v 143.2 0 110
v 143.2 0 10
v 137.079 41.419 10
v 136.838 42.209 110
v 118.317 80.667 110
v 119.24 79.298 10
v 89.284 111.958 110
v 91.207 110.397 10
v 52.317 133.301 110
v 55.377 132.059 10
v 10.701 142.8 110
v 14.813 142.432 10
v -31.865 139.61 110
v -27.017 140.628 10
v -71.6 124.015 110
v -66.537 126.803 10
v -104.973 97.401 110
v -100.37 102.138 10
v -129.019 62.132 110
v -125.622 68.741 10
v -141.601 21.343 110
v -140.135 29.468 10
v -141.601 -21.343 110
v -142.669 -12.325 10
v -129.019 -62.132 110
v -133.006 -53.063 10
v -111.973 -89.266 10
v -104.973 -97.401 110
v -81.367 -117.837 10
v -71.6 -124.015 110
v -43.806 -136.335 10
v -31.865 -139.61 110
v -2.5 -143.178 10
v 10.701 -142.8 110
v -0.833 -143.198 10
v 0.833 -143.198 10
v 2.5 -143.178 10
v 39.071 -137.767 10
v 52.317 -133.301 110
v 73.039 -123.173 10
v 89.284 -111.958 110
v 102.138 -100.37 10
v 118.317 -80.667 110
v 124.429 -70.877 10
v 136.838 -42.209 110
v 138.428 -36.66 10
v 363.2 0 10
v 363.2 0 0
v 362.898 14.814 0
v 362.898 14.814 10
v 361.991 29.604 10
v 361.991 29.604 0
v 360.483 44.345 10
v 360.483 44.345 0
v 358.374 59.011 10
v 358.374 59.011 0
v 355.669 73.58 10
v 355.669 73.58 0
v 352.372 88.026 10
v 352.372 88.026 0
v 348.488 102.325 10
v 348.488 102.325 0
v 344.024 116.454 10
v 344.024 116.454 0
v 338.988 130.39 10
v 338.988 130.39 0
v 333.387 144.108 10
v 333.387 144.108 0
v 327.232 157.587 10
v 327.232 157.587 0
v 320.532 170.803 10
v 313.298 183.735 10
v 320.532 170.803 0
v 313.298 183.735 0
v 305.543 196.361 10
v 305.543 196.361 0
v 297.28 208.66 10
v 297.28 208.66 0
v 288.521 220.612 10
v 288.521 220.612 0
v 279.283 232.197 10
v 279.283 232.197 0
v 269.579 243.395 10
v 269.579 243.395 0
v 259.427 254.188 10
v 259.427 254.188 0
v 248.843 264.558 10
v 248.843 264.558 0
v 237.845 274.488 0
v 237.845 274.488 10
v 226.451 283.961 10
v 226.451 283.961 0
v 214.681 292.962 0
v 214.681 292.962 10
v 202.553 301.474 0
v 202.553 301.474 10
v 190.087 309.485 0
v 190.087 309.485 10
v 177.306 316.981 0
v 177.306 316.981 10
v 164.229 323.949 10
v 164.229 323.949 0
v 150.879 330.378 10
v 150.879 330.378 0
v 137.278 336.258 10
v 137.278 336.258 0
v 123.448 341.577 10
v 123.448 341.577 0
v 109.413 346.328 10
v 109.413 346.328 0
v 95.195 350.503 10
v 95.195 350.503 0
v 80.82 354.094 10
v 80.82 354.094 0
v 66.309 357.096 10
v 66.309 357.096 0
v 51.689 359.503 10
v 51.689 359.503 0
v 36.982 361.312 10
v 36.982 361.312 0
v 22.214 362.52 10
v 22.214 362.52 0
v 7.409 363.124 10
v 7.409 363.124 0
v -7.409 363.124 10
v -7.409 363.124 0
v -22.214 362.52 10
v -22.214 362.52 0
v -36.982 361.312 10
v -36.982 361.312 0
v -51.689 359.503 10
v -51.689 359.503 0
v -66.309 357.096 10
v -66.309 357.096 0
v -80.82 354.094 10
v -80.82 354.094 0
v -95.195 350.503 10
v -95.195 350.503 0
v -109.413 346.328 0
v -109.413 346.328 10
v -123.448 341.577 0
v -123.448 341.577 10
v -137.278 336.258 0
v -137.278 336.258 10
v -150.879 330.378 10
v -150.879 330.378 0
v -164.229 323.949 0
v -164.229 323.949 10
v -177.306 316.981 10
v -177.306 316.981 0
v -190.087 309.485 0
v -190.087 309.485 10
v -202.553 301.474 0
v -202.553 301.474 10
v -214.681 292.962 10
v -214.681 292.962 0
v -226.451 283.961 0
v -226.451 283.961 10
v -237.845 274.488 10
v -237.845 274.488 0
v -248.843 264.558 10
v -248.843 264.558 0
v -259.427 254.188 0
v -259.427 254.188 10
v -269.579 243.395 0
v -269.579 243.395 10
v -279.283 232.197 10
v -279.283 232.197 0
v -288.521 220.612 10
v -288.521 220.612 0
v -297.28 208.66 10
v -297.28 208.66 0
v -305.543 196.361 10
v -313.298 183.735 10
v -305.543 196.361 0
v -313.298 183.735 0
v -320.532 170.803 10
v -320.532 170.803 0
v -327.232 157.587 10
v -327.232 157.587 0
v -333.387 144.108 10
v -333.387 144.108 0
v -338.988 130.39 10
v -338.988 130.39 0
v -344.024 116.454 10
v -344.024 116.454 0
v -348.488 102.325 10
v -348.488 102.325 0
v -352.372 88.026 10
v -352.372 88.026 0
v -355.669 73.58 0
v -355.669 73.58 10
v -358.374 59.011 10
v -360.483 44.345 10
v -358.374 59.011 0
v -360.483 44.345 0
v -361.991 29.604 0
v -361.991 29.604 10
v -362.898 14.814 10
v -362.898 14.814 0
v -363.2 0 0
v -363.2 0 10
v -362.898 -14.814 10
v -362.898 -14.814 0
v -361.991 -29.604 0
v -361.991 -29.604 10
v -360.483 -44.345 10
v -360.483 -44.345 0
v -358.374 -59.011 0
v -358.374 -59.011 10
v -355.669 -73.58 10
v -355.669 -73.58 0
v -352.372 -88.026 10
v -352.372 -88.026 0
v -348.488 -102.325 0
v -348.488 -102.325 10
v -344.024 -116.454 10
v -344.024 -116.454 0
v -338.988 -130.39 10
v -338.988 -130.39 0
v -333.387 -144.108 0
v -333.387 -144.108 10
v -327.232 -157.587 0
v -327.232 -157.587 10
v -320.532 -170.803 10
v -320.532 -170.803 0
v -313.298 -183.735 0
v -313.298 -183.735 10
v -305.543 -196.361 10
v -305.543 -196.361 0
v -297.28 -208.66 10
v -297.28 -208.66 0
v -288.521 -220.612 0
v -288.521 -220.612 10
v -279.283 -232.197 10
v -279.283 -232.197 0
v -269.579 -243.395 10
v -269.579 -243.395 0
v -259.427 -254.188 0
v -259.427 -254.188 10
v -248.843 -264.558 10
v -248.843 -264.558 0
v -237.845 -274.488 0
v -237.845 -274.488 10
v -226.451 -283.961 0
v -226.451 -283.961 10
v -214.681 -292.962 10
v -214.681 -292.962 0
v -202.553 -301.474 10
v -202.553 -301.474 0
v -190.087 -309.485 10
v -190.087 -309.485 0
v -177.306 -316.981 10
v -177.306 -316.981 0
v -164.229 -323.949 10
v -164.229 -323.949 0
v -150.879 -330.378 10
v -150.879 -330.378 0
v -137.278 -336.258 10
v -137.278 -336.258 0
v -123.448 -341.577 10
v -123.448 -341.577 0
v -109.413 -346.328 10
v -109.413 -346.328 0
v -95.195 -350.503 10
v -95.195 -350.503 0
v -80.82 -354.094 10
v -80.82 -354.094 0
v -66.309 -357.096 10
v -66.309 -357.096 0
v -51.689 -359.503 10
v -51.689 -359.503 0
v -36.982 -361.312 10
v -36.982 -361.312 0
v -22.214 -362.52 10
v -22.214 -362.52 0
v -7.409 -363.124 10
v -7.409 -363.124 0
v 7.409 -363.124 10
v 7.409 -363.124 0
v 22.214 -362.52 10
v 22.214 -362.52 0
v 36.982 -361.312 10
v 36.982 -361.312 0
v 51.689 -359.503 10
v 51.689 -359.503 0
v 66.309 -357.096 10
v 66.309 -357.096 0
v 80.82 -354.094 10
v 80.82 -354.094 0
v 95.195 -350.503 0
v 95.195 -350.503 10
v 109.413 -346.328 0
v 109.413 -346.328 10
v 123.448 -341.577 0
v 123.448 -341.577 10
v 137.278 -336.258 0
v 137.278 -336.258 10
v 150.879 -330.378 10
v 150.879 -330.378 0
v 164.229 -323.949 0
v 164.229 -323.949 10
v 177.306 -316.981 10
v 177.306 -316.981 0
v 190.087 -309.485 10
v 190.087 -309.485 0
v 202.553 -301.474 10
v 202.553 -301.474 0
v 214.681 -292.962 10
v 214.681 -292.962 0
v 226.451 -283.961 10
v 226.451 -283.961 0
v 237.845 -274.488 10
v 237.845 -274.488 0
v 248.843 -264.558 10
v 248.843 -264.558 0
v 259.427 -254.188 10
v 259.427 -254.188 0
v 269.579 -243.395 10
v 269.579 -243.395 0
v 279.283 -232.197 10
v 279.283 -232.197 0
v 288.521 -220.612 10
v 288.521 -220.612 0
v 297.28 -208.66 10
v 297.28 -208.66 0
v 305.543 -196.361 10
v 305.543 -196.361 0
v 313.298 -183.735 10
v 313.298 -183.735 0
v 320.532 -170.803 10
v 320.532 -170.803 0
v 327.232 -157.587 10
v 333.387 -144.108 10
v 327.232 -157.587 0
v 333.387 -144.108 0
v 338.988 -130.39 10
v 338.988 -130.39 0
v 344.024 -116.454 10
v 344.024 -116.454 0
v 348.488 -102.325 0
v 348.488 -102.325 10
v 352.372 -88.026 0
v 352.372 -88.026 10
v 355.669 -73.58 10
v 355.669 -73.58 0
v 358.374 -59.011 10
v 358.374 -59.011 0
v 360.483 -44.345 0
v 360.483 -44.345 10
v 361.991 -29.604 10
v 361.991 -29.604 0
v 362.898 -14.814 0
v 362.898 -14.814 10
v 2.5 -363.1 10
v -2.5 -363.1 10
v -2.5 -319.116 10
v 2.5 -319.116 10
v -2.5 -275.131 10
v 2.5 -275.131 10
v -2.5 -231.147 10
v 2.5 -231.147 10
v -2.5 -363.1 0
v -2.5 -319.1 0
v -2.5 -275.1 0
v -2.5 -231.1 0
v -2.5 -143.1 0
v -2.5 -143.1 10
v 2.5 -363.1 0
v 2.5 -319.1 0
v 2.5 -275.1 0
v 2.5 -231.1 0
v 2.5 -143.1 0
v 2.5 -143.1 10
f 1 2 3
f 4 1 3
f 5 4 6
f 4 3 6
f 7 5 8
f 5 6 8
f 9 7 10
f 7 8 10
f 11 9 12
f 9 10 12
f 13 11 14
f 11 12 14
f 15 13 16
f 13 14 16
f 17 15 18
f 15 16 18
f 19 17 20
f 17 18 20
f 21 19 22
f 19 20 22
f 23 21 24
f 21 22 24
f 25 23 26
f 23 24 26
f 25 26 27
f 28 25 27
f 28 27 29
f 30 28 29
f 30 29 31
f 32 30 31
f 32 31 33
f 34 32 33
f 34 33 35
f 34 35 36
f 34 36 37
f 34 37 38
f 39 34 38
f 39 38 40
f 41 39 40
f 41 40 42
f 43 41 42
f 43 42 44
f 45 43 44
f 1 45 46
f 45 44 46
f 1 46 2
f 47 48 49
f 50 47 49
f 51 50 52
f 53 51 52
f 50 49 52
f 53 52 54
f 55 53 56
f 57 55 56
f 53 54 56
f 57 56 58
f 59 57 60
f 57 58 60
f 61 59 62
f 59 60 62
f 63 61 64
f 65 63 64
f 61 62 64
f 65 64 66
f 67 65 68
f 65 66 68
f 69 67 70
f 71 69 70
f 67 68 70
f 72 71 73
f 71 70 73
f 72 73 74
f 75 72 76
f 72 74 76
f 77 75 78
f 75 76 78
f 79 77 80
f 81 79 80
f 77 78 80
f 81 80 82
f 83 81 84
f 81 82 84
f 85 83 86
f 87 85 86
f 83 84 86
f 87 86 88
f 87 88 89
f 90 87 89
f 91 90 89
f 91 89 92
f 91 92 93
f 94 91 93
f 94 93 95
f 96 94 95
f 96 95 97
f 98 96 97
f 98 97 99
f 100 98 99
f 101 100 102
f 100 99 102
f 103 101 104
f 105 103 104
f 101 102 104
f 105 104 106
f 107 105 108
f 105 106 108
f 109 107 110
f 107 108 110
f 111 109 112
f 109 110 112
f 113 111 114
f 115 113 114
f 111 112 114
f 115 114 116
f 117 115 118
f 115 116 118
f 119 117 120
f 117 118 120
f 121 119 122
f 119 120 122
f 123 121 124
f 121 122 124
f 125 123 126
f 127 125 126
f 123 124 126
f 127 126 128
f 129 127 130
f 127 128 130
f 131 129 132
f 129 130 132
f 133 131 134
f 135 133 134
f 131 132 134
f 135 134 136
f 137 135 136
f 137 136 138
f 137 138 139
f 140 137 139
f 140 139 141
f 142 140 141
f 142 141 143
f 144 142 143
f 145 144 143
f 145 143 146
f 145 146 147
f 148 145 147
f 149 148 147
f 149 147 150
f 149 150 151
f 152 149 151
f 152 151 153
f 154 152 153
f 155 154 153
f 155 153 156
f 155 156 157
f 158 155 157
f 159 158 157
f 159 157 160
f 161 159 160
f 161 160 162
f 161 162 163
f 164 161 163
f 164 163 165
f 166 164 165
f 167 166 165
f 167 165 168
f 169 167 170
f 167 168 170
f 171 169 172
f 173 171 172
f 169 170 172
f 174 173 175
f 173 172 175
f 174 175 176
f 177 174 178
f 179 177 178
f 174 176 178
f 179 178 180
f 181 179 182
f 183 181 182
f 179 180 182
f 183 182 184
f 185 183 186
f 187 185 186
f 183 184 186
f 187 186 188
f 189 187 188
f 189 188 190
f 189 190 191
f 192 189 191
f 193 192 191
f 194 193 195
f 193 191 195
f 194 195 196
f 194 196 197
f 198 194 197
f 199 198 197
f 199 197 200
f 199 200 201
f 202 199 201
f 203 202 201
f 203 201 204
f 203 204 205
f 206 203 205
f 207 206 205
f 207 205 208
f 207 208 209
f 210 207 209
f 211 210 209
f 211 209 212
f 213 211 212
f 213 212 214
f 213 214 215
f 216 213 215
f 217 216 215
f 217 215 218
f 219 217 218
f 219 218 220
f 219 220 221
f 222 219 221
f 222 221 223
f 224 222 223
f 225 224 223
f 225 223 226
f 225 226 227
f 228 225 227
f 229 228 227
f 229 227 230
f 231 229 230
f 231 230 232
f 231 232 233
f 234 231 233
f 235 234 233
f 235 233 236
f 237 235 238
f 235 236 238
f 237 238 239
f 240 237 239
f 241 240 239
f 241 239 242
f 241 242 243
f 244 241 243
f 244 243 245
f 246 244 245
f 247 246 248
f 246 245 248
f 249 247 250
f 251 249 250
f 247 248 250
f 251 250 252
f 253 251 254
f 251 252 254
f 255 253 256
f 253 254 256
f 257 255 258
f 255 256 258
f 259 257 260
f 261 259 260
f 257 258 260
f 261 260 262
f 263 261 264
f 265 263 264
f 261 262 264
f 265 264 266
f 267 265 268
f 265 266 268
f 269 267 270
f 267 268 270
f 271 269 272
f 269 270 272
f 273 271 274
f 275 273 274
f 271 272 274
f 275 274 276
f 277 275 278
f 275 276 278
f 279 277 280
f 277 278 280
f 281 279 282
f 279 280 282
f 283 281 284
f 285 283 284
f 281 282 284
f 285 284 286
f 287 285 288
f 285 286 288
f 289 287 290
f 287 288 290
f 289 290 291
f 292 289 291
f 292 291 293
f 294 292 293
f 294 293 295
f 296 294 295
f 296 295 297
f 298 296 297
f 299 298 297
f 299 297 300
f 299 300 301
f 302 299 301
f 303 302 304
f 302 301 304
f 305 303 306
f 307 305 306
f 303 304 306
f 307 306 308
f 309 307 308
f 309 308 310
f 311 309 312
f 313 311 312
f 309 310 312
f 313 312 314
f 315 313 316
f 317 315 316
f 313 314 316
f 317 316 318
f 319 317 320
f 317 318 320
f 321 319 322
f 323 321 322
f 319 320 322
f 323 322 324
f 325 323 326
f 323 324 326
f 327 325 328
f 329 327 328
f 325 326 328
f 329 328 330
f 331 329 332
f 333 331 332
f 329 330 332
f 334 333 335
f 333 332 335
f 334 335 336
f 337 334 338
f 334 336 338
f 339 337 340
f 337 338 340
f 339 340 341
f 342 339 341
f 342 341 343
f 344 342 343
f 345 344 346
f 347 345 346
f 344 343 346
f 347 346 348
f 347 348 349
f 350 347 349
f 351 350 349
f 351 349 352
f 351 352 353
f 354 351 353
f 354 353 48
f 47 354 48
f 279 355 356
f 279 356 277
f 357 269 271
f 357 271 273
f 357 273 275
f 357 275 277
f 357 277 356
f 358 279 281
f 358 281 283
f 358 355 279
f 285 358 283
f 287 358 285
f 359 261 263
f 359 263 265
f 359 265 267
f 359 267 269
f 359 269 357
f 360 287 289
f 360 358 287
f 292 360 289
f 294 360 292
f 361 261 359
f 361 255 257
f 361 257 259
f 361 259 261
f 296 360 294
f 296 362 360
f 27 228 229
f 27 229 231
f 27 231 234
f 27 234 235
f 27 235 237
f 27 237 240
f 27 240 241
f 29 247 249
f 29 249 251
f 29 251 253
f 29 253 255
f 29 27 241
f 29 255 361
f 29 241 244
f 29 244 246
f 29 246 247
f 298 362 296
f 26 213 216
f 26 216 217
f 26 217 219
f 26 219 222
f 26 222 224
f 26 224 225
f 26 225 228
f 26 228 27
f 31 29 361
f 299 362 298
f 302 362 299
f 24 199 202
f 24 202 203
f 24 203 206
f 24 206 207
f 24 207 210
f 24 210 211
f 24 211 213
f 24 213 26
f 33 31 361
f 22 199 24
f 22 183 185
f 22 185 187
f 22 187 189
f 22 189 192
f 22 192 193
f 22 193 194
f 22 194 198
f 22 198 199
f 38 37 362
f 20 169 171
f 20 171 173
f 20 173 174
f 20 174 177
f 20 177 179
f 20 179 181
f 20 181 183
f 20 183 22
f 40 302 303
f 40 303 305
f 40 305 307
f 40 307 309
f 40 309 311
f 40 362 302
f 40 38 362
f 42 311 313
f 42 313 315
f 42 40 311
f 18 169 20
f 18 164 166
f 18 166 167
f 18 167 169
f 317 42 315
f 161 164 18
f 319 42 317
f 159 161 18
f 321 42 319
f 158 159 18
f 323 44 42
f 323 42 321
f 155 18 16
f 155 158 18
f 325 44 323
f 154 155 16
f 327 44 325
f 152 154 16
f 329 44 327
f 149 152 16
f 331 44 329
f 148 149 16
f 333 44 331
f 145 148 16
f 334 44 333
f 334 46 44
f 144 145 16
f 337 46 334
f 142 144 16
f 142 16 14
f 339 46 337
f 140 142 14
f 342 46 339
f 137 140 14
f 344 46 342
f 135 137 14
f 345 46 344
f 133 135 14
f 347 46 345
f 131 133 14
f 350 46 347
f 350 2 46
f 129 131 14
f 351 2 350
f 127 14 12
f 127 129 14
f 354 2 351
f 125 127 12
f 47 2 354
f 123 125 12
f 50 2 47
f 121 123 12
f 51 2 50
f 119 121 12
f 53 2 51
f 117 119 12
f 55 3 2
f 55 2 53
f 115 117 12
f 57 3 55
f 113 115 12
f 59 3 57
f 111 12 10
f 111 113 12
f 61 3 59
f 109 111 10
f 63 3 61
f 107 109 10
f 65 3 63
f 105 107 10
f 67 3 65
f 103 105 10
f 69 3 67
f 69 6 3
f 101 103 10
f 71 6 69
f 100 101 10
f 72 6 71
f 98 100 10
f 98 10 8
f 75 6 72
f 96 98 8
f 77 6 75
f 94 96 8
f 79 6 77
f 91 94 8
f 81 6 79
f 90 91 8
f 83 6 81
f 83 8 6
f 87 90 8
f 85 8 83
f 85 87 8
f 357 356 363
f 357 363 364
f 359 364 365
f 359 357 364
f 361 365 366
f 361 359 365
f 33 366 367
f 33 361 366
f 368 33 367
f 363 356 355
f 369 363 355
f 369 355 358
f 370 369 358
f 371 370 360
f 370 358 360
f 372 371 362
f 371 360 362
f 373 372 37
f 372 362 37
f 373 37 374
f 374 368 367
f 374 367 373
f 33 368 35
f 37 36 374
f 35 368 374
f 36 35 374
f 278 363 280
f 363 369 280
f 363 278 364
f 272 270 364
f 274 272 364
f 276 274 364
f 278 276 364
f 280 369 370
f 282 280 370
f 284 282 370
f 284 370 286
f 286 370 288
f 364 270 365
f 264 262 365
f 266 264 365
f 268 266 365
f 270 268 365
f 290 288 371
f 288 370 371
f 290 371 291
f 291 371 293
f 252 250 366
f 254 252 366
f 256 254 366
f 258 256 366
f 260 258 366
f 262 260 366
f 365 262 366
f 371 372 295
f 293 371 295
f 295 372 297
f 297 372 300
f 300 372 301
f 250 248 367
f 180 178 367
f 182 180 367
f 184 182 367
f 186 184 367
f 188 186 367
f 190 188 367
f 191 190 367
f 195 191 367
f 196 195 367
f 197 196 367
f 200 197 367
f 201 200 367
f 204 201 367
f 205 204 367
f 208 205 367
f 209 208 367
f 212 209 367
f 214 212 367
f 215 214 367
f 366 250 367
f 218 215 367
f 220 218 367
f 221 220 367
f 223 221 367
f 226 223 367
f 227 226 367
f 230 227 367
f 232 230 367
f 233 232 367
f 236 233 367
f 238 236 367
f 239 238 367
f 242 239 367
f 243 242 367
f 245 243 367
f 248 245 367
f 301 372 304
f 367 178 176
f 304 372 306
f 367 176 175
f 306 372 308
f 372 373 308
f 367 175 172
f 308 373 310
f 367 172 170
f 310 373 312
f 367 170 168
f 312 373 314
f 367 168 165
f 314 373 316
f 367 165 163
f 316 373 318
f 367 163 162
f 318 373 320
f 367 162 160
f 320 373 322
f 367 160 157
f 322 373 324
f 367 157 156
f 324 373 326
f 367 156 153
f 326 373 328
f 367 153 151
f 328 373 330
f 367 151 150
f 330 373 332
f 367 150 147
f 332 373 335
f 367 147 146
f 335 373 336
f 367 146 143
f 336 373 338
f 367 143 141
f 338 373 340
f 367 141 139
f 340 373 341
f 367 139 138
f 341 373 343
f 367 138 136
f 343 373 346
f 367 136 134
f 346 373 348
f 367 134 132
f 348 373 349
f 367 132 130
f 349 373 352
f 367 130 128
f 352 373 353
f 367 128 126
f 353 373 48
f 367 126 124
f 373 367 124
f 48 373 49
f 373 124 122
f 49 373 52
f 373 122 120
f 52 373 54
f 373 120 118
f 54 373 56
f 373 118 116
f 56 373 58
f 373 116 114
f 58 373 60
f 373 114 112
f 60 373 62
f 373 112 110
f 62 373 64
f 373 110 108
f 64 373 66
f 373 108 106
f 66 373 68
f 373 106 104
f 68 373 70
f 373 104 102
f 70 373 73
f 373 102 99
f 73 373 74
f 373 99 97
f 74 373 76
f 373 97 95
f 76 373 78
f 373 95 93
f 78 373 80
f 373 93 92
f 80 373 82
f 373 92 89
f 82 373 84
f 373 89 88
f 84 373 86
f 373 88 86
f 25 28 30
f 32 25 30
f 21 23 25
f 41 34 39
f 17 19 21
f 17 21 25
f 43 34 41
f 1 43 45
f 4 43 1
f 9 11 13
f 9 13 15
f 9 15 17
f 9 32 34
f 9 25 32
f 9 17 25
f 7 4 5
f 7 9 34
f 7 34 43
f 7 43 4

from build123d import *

# Parameters (mm, degrees)
ESQUISSE1_R             = 363.2
BOSS_EXTRU_1_DEPTH      = 10
ESQUISSE2_R             = 143.2
BOSS_EXTRU_2_DEPTH      = 100
ESQUISSE4_W             = 5
ESQUISSE4_H             = 220
ENL_V_MAT_EXTRU_1_DEPTH = 524.286231426


with BuildPart() as part:
    # Esquisse1 → Boss.-Extru.1 (new body)
    with BuildSketch(Plane.XY):
        Circle(ESQUISSE1_R)
    extrude(amount=BOSS_EXTRU_1_DEPTH)

    # Esquisse2 → Boss.-Extru.2 (add)
    with BuildSketch(Plane.XY.offset(10)):
        Circle(ESQUISSE2_R)
    extrude(amount=BOSS_EXTRU_2_DEPTH)

    # Esquisse4 → Enlèv. mat.-Extru.1 (cut, through all)
    with BuildSketch(Plane.XY.offset(10)):
        with Locations((0, -253.1)):
            Rectangle(ESQUISSE4_W, ESQUISSE4_H)
    extrude(amount=-ENL_V_MAT_EXTRU_1_DEPTH, mode=Mode.SUBTRACT)


solid = part.part
